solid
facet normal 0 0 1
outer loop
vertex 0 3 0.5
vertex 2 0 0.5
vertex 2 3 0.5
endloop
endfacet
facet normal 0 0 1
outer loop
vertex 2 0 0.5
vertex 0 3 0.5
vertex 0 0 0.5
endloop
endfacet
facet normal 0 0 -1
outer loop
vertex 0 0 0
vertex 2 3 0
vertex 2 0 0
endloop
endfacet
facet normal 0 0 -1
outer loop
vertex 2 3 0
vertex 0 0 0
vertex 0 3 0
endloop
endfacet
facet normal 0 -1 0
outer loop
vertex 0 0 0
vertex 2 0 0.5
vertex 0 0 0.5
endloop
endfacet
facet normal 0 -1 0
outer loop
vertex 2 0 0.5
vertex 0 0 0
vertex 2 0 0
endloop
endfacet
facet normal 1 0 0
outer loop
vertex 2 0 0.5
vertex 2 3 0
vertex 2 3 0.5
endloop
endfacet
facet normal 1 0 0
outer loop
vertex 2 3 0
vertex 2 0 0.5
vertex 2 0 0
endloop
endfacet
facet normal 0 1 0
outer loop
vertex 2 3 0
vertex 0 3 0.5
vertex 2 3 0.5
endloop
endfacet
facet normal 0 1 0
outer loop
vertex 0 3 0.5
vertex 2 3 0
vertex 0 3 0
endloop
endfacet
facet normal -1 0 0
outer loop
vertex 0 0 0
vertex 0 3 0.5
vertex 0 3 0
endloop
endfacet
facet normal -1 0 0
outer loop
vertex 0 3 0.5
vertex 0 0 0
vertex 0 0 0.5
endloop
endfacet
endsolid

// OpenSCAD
// Generated by scadwright. Do not hand-edit —
// edit the Python source and regenerate.

scale([2, 3, 0.5]) {
    cube([1, 1, 1], center=false);
}
